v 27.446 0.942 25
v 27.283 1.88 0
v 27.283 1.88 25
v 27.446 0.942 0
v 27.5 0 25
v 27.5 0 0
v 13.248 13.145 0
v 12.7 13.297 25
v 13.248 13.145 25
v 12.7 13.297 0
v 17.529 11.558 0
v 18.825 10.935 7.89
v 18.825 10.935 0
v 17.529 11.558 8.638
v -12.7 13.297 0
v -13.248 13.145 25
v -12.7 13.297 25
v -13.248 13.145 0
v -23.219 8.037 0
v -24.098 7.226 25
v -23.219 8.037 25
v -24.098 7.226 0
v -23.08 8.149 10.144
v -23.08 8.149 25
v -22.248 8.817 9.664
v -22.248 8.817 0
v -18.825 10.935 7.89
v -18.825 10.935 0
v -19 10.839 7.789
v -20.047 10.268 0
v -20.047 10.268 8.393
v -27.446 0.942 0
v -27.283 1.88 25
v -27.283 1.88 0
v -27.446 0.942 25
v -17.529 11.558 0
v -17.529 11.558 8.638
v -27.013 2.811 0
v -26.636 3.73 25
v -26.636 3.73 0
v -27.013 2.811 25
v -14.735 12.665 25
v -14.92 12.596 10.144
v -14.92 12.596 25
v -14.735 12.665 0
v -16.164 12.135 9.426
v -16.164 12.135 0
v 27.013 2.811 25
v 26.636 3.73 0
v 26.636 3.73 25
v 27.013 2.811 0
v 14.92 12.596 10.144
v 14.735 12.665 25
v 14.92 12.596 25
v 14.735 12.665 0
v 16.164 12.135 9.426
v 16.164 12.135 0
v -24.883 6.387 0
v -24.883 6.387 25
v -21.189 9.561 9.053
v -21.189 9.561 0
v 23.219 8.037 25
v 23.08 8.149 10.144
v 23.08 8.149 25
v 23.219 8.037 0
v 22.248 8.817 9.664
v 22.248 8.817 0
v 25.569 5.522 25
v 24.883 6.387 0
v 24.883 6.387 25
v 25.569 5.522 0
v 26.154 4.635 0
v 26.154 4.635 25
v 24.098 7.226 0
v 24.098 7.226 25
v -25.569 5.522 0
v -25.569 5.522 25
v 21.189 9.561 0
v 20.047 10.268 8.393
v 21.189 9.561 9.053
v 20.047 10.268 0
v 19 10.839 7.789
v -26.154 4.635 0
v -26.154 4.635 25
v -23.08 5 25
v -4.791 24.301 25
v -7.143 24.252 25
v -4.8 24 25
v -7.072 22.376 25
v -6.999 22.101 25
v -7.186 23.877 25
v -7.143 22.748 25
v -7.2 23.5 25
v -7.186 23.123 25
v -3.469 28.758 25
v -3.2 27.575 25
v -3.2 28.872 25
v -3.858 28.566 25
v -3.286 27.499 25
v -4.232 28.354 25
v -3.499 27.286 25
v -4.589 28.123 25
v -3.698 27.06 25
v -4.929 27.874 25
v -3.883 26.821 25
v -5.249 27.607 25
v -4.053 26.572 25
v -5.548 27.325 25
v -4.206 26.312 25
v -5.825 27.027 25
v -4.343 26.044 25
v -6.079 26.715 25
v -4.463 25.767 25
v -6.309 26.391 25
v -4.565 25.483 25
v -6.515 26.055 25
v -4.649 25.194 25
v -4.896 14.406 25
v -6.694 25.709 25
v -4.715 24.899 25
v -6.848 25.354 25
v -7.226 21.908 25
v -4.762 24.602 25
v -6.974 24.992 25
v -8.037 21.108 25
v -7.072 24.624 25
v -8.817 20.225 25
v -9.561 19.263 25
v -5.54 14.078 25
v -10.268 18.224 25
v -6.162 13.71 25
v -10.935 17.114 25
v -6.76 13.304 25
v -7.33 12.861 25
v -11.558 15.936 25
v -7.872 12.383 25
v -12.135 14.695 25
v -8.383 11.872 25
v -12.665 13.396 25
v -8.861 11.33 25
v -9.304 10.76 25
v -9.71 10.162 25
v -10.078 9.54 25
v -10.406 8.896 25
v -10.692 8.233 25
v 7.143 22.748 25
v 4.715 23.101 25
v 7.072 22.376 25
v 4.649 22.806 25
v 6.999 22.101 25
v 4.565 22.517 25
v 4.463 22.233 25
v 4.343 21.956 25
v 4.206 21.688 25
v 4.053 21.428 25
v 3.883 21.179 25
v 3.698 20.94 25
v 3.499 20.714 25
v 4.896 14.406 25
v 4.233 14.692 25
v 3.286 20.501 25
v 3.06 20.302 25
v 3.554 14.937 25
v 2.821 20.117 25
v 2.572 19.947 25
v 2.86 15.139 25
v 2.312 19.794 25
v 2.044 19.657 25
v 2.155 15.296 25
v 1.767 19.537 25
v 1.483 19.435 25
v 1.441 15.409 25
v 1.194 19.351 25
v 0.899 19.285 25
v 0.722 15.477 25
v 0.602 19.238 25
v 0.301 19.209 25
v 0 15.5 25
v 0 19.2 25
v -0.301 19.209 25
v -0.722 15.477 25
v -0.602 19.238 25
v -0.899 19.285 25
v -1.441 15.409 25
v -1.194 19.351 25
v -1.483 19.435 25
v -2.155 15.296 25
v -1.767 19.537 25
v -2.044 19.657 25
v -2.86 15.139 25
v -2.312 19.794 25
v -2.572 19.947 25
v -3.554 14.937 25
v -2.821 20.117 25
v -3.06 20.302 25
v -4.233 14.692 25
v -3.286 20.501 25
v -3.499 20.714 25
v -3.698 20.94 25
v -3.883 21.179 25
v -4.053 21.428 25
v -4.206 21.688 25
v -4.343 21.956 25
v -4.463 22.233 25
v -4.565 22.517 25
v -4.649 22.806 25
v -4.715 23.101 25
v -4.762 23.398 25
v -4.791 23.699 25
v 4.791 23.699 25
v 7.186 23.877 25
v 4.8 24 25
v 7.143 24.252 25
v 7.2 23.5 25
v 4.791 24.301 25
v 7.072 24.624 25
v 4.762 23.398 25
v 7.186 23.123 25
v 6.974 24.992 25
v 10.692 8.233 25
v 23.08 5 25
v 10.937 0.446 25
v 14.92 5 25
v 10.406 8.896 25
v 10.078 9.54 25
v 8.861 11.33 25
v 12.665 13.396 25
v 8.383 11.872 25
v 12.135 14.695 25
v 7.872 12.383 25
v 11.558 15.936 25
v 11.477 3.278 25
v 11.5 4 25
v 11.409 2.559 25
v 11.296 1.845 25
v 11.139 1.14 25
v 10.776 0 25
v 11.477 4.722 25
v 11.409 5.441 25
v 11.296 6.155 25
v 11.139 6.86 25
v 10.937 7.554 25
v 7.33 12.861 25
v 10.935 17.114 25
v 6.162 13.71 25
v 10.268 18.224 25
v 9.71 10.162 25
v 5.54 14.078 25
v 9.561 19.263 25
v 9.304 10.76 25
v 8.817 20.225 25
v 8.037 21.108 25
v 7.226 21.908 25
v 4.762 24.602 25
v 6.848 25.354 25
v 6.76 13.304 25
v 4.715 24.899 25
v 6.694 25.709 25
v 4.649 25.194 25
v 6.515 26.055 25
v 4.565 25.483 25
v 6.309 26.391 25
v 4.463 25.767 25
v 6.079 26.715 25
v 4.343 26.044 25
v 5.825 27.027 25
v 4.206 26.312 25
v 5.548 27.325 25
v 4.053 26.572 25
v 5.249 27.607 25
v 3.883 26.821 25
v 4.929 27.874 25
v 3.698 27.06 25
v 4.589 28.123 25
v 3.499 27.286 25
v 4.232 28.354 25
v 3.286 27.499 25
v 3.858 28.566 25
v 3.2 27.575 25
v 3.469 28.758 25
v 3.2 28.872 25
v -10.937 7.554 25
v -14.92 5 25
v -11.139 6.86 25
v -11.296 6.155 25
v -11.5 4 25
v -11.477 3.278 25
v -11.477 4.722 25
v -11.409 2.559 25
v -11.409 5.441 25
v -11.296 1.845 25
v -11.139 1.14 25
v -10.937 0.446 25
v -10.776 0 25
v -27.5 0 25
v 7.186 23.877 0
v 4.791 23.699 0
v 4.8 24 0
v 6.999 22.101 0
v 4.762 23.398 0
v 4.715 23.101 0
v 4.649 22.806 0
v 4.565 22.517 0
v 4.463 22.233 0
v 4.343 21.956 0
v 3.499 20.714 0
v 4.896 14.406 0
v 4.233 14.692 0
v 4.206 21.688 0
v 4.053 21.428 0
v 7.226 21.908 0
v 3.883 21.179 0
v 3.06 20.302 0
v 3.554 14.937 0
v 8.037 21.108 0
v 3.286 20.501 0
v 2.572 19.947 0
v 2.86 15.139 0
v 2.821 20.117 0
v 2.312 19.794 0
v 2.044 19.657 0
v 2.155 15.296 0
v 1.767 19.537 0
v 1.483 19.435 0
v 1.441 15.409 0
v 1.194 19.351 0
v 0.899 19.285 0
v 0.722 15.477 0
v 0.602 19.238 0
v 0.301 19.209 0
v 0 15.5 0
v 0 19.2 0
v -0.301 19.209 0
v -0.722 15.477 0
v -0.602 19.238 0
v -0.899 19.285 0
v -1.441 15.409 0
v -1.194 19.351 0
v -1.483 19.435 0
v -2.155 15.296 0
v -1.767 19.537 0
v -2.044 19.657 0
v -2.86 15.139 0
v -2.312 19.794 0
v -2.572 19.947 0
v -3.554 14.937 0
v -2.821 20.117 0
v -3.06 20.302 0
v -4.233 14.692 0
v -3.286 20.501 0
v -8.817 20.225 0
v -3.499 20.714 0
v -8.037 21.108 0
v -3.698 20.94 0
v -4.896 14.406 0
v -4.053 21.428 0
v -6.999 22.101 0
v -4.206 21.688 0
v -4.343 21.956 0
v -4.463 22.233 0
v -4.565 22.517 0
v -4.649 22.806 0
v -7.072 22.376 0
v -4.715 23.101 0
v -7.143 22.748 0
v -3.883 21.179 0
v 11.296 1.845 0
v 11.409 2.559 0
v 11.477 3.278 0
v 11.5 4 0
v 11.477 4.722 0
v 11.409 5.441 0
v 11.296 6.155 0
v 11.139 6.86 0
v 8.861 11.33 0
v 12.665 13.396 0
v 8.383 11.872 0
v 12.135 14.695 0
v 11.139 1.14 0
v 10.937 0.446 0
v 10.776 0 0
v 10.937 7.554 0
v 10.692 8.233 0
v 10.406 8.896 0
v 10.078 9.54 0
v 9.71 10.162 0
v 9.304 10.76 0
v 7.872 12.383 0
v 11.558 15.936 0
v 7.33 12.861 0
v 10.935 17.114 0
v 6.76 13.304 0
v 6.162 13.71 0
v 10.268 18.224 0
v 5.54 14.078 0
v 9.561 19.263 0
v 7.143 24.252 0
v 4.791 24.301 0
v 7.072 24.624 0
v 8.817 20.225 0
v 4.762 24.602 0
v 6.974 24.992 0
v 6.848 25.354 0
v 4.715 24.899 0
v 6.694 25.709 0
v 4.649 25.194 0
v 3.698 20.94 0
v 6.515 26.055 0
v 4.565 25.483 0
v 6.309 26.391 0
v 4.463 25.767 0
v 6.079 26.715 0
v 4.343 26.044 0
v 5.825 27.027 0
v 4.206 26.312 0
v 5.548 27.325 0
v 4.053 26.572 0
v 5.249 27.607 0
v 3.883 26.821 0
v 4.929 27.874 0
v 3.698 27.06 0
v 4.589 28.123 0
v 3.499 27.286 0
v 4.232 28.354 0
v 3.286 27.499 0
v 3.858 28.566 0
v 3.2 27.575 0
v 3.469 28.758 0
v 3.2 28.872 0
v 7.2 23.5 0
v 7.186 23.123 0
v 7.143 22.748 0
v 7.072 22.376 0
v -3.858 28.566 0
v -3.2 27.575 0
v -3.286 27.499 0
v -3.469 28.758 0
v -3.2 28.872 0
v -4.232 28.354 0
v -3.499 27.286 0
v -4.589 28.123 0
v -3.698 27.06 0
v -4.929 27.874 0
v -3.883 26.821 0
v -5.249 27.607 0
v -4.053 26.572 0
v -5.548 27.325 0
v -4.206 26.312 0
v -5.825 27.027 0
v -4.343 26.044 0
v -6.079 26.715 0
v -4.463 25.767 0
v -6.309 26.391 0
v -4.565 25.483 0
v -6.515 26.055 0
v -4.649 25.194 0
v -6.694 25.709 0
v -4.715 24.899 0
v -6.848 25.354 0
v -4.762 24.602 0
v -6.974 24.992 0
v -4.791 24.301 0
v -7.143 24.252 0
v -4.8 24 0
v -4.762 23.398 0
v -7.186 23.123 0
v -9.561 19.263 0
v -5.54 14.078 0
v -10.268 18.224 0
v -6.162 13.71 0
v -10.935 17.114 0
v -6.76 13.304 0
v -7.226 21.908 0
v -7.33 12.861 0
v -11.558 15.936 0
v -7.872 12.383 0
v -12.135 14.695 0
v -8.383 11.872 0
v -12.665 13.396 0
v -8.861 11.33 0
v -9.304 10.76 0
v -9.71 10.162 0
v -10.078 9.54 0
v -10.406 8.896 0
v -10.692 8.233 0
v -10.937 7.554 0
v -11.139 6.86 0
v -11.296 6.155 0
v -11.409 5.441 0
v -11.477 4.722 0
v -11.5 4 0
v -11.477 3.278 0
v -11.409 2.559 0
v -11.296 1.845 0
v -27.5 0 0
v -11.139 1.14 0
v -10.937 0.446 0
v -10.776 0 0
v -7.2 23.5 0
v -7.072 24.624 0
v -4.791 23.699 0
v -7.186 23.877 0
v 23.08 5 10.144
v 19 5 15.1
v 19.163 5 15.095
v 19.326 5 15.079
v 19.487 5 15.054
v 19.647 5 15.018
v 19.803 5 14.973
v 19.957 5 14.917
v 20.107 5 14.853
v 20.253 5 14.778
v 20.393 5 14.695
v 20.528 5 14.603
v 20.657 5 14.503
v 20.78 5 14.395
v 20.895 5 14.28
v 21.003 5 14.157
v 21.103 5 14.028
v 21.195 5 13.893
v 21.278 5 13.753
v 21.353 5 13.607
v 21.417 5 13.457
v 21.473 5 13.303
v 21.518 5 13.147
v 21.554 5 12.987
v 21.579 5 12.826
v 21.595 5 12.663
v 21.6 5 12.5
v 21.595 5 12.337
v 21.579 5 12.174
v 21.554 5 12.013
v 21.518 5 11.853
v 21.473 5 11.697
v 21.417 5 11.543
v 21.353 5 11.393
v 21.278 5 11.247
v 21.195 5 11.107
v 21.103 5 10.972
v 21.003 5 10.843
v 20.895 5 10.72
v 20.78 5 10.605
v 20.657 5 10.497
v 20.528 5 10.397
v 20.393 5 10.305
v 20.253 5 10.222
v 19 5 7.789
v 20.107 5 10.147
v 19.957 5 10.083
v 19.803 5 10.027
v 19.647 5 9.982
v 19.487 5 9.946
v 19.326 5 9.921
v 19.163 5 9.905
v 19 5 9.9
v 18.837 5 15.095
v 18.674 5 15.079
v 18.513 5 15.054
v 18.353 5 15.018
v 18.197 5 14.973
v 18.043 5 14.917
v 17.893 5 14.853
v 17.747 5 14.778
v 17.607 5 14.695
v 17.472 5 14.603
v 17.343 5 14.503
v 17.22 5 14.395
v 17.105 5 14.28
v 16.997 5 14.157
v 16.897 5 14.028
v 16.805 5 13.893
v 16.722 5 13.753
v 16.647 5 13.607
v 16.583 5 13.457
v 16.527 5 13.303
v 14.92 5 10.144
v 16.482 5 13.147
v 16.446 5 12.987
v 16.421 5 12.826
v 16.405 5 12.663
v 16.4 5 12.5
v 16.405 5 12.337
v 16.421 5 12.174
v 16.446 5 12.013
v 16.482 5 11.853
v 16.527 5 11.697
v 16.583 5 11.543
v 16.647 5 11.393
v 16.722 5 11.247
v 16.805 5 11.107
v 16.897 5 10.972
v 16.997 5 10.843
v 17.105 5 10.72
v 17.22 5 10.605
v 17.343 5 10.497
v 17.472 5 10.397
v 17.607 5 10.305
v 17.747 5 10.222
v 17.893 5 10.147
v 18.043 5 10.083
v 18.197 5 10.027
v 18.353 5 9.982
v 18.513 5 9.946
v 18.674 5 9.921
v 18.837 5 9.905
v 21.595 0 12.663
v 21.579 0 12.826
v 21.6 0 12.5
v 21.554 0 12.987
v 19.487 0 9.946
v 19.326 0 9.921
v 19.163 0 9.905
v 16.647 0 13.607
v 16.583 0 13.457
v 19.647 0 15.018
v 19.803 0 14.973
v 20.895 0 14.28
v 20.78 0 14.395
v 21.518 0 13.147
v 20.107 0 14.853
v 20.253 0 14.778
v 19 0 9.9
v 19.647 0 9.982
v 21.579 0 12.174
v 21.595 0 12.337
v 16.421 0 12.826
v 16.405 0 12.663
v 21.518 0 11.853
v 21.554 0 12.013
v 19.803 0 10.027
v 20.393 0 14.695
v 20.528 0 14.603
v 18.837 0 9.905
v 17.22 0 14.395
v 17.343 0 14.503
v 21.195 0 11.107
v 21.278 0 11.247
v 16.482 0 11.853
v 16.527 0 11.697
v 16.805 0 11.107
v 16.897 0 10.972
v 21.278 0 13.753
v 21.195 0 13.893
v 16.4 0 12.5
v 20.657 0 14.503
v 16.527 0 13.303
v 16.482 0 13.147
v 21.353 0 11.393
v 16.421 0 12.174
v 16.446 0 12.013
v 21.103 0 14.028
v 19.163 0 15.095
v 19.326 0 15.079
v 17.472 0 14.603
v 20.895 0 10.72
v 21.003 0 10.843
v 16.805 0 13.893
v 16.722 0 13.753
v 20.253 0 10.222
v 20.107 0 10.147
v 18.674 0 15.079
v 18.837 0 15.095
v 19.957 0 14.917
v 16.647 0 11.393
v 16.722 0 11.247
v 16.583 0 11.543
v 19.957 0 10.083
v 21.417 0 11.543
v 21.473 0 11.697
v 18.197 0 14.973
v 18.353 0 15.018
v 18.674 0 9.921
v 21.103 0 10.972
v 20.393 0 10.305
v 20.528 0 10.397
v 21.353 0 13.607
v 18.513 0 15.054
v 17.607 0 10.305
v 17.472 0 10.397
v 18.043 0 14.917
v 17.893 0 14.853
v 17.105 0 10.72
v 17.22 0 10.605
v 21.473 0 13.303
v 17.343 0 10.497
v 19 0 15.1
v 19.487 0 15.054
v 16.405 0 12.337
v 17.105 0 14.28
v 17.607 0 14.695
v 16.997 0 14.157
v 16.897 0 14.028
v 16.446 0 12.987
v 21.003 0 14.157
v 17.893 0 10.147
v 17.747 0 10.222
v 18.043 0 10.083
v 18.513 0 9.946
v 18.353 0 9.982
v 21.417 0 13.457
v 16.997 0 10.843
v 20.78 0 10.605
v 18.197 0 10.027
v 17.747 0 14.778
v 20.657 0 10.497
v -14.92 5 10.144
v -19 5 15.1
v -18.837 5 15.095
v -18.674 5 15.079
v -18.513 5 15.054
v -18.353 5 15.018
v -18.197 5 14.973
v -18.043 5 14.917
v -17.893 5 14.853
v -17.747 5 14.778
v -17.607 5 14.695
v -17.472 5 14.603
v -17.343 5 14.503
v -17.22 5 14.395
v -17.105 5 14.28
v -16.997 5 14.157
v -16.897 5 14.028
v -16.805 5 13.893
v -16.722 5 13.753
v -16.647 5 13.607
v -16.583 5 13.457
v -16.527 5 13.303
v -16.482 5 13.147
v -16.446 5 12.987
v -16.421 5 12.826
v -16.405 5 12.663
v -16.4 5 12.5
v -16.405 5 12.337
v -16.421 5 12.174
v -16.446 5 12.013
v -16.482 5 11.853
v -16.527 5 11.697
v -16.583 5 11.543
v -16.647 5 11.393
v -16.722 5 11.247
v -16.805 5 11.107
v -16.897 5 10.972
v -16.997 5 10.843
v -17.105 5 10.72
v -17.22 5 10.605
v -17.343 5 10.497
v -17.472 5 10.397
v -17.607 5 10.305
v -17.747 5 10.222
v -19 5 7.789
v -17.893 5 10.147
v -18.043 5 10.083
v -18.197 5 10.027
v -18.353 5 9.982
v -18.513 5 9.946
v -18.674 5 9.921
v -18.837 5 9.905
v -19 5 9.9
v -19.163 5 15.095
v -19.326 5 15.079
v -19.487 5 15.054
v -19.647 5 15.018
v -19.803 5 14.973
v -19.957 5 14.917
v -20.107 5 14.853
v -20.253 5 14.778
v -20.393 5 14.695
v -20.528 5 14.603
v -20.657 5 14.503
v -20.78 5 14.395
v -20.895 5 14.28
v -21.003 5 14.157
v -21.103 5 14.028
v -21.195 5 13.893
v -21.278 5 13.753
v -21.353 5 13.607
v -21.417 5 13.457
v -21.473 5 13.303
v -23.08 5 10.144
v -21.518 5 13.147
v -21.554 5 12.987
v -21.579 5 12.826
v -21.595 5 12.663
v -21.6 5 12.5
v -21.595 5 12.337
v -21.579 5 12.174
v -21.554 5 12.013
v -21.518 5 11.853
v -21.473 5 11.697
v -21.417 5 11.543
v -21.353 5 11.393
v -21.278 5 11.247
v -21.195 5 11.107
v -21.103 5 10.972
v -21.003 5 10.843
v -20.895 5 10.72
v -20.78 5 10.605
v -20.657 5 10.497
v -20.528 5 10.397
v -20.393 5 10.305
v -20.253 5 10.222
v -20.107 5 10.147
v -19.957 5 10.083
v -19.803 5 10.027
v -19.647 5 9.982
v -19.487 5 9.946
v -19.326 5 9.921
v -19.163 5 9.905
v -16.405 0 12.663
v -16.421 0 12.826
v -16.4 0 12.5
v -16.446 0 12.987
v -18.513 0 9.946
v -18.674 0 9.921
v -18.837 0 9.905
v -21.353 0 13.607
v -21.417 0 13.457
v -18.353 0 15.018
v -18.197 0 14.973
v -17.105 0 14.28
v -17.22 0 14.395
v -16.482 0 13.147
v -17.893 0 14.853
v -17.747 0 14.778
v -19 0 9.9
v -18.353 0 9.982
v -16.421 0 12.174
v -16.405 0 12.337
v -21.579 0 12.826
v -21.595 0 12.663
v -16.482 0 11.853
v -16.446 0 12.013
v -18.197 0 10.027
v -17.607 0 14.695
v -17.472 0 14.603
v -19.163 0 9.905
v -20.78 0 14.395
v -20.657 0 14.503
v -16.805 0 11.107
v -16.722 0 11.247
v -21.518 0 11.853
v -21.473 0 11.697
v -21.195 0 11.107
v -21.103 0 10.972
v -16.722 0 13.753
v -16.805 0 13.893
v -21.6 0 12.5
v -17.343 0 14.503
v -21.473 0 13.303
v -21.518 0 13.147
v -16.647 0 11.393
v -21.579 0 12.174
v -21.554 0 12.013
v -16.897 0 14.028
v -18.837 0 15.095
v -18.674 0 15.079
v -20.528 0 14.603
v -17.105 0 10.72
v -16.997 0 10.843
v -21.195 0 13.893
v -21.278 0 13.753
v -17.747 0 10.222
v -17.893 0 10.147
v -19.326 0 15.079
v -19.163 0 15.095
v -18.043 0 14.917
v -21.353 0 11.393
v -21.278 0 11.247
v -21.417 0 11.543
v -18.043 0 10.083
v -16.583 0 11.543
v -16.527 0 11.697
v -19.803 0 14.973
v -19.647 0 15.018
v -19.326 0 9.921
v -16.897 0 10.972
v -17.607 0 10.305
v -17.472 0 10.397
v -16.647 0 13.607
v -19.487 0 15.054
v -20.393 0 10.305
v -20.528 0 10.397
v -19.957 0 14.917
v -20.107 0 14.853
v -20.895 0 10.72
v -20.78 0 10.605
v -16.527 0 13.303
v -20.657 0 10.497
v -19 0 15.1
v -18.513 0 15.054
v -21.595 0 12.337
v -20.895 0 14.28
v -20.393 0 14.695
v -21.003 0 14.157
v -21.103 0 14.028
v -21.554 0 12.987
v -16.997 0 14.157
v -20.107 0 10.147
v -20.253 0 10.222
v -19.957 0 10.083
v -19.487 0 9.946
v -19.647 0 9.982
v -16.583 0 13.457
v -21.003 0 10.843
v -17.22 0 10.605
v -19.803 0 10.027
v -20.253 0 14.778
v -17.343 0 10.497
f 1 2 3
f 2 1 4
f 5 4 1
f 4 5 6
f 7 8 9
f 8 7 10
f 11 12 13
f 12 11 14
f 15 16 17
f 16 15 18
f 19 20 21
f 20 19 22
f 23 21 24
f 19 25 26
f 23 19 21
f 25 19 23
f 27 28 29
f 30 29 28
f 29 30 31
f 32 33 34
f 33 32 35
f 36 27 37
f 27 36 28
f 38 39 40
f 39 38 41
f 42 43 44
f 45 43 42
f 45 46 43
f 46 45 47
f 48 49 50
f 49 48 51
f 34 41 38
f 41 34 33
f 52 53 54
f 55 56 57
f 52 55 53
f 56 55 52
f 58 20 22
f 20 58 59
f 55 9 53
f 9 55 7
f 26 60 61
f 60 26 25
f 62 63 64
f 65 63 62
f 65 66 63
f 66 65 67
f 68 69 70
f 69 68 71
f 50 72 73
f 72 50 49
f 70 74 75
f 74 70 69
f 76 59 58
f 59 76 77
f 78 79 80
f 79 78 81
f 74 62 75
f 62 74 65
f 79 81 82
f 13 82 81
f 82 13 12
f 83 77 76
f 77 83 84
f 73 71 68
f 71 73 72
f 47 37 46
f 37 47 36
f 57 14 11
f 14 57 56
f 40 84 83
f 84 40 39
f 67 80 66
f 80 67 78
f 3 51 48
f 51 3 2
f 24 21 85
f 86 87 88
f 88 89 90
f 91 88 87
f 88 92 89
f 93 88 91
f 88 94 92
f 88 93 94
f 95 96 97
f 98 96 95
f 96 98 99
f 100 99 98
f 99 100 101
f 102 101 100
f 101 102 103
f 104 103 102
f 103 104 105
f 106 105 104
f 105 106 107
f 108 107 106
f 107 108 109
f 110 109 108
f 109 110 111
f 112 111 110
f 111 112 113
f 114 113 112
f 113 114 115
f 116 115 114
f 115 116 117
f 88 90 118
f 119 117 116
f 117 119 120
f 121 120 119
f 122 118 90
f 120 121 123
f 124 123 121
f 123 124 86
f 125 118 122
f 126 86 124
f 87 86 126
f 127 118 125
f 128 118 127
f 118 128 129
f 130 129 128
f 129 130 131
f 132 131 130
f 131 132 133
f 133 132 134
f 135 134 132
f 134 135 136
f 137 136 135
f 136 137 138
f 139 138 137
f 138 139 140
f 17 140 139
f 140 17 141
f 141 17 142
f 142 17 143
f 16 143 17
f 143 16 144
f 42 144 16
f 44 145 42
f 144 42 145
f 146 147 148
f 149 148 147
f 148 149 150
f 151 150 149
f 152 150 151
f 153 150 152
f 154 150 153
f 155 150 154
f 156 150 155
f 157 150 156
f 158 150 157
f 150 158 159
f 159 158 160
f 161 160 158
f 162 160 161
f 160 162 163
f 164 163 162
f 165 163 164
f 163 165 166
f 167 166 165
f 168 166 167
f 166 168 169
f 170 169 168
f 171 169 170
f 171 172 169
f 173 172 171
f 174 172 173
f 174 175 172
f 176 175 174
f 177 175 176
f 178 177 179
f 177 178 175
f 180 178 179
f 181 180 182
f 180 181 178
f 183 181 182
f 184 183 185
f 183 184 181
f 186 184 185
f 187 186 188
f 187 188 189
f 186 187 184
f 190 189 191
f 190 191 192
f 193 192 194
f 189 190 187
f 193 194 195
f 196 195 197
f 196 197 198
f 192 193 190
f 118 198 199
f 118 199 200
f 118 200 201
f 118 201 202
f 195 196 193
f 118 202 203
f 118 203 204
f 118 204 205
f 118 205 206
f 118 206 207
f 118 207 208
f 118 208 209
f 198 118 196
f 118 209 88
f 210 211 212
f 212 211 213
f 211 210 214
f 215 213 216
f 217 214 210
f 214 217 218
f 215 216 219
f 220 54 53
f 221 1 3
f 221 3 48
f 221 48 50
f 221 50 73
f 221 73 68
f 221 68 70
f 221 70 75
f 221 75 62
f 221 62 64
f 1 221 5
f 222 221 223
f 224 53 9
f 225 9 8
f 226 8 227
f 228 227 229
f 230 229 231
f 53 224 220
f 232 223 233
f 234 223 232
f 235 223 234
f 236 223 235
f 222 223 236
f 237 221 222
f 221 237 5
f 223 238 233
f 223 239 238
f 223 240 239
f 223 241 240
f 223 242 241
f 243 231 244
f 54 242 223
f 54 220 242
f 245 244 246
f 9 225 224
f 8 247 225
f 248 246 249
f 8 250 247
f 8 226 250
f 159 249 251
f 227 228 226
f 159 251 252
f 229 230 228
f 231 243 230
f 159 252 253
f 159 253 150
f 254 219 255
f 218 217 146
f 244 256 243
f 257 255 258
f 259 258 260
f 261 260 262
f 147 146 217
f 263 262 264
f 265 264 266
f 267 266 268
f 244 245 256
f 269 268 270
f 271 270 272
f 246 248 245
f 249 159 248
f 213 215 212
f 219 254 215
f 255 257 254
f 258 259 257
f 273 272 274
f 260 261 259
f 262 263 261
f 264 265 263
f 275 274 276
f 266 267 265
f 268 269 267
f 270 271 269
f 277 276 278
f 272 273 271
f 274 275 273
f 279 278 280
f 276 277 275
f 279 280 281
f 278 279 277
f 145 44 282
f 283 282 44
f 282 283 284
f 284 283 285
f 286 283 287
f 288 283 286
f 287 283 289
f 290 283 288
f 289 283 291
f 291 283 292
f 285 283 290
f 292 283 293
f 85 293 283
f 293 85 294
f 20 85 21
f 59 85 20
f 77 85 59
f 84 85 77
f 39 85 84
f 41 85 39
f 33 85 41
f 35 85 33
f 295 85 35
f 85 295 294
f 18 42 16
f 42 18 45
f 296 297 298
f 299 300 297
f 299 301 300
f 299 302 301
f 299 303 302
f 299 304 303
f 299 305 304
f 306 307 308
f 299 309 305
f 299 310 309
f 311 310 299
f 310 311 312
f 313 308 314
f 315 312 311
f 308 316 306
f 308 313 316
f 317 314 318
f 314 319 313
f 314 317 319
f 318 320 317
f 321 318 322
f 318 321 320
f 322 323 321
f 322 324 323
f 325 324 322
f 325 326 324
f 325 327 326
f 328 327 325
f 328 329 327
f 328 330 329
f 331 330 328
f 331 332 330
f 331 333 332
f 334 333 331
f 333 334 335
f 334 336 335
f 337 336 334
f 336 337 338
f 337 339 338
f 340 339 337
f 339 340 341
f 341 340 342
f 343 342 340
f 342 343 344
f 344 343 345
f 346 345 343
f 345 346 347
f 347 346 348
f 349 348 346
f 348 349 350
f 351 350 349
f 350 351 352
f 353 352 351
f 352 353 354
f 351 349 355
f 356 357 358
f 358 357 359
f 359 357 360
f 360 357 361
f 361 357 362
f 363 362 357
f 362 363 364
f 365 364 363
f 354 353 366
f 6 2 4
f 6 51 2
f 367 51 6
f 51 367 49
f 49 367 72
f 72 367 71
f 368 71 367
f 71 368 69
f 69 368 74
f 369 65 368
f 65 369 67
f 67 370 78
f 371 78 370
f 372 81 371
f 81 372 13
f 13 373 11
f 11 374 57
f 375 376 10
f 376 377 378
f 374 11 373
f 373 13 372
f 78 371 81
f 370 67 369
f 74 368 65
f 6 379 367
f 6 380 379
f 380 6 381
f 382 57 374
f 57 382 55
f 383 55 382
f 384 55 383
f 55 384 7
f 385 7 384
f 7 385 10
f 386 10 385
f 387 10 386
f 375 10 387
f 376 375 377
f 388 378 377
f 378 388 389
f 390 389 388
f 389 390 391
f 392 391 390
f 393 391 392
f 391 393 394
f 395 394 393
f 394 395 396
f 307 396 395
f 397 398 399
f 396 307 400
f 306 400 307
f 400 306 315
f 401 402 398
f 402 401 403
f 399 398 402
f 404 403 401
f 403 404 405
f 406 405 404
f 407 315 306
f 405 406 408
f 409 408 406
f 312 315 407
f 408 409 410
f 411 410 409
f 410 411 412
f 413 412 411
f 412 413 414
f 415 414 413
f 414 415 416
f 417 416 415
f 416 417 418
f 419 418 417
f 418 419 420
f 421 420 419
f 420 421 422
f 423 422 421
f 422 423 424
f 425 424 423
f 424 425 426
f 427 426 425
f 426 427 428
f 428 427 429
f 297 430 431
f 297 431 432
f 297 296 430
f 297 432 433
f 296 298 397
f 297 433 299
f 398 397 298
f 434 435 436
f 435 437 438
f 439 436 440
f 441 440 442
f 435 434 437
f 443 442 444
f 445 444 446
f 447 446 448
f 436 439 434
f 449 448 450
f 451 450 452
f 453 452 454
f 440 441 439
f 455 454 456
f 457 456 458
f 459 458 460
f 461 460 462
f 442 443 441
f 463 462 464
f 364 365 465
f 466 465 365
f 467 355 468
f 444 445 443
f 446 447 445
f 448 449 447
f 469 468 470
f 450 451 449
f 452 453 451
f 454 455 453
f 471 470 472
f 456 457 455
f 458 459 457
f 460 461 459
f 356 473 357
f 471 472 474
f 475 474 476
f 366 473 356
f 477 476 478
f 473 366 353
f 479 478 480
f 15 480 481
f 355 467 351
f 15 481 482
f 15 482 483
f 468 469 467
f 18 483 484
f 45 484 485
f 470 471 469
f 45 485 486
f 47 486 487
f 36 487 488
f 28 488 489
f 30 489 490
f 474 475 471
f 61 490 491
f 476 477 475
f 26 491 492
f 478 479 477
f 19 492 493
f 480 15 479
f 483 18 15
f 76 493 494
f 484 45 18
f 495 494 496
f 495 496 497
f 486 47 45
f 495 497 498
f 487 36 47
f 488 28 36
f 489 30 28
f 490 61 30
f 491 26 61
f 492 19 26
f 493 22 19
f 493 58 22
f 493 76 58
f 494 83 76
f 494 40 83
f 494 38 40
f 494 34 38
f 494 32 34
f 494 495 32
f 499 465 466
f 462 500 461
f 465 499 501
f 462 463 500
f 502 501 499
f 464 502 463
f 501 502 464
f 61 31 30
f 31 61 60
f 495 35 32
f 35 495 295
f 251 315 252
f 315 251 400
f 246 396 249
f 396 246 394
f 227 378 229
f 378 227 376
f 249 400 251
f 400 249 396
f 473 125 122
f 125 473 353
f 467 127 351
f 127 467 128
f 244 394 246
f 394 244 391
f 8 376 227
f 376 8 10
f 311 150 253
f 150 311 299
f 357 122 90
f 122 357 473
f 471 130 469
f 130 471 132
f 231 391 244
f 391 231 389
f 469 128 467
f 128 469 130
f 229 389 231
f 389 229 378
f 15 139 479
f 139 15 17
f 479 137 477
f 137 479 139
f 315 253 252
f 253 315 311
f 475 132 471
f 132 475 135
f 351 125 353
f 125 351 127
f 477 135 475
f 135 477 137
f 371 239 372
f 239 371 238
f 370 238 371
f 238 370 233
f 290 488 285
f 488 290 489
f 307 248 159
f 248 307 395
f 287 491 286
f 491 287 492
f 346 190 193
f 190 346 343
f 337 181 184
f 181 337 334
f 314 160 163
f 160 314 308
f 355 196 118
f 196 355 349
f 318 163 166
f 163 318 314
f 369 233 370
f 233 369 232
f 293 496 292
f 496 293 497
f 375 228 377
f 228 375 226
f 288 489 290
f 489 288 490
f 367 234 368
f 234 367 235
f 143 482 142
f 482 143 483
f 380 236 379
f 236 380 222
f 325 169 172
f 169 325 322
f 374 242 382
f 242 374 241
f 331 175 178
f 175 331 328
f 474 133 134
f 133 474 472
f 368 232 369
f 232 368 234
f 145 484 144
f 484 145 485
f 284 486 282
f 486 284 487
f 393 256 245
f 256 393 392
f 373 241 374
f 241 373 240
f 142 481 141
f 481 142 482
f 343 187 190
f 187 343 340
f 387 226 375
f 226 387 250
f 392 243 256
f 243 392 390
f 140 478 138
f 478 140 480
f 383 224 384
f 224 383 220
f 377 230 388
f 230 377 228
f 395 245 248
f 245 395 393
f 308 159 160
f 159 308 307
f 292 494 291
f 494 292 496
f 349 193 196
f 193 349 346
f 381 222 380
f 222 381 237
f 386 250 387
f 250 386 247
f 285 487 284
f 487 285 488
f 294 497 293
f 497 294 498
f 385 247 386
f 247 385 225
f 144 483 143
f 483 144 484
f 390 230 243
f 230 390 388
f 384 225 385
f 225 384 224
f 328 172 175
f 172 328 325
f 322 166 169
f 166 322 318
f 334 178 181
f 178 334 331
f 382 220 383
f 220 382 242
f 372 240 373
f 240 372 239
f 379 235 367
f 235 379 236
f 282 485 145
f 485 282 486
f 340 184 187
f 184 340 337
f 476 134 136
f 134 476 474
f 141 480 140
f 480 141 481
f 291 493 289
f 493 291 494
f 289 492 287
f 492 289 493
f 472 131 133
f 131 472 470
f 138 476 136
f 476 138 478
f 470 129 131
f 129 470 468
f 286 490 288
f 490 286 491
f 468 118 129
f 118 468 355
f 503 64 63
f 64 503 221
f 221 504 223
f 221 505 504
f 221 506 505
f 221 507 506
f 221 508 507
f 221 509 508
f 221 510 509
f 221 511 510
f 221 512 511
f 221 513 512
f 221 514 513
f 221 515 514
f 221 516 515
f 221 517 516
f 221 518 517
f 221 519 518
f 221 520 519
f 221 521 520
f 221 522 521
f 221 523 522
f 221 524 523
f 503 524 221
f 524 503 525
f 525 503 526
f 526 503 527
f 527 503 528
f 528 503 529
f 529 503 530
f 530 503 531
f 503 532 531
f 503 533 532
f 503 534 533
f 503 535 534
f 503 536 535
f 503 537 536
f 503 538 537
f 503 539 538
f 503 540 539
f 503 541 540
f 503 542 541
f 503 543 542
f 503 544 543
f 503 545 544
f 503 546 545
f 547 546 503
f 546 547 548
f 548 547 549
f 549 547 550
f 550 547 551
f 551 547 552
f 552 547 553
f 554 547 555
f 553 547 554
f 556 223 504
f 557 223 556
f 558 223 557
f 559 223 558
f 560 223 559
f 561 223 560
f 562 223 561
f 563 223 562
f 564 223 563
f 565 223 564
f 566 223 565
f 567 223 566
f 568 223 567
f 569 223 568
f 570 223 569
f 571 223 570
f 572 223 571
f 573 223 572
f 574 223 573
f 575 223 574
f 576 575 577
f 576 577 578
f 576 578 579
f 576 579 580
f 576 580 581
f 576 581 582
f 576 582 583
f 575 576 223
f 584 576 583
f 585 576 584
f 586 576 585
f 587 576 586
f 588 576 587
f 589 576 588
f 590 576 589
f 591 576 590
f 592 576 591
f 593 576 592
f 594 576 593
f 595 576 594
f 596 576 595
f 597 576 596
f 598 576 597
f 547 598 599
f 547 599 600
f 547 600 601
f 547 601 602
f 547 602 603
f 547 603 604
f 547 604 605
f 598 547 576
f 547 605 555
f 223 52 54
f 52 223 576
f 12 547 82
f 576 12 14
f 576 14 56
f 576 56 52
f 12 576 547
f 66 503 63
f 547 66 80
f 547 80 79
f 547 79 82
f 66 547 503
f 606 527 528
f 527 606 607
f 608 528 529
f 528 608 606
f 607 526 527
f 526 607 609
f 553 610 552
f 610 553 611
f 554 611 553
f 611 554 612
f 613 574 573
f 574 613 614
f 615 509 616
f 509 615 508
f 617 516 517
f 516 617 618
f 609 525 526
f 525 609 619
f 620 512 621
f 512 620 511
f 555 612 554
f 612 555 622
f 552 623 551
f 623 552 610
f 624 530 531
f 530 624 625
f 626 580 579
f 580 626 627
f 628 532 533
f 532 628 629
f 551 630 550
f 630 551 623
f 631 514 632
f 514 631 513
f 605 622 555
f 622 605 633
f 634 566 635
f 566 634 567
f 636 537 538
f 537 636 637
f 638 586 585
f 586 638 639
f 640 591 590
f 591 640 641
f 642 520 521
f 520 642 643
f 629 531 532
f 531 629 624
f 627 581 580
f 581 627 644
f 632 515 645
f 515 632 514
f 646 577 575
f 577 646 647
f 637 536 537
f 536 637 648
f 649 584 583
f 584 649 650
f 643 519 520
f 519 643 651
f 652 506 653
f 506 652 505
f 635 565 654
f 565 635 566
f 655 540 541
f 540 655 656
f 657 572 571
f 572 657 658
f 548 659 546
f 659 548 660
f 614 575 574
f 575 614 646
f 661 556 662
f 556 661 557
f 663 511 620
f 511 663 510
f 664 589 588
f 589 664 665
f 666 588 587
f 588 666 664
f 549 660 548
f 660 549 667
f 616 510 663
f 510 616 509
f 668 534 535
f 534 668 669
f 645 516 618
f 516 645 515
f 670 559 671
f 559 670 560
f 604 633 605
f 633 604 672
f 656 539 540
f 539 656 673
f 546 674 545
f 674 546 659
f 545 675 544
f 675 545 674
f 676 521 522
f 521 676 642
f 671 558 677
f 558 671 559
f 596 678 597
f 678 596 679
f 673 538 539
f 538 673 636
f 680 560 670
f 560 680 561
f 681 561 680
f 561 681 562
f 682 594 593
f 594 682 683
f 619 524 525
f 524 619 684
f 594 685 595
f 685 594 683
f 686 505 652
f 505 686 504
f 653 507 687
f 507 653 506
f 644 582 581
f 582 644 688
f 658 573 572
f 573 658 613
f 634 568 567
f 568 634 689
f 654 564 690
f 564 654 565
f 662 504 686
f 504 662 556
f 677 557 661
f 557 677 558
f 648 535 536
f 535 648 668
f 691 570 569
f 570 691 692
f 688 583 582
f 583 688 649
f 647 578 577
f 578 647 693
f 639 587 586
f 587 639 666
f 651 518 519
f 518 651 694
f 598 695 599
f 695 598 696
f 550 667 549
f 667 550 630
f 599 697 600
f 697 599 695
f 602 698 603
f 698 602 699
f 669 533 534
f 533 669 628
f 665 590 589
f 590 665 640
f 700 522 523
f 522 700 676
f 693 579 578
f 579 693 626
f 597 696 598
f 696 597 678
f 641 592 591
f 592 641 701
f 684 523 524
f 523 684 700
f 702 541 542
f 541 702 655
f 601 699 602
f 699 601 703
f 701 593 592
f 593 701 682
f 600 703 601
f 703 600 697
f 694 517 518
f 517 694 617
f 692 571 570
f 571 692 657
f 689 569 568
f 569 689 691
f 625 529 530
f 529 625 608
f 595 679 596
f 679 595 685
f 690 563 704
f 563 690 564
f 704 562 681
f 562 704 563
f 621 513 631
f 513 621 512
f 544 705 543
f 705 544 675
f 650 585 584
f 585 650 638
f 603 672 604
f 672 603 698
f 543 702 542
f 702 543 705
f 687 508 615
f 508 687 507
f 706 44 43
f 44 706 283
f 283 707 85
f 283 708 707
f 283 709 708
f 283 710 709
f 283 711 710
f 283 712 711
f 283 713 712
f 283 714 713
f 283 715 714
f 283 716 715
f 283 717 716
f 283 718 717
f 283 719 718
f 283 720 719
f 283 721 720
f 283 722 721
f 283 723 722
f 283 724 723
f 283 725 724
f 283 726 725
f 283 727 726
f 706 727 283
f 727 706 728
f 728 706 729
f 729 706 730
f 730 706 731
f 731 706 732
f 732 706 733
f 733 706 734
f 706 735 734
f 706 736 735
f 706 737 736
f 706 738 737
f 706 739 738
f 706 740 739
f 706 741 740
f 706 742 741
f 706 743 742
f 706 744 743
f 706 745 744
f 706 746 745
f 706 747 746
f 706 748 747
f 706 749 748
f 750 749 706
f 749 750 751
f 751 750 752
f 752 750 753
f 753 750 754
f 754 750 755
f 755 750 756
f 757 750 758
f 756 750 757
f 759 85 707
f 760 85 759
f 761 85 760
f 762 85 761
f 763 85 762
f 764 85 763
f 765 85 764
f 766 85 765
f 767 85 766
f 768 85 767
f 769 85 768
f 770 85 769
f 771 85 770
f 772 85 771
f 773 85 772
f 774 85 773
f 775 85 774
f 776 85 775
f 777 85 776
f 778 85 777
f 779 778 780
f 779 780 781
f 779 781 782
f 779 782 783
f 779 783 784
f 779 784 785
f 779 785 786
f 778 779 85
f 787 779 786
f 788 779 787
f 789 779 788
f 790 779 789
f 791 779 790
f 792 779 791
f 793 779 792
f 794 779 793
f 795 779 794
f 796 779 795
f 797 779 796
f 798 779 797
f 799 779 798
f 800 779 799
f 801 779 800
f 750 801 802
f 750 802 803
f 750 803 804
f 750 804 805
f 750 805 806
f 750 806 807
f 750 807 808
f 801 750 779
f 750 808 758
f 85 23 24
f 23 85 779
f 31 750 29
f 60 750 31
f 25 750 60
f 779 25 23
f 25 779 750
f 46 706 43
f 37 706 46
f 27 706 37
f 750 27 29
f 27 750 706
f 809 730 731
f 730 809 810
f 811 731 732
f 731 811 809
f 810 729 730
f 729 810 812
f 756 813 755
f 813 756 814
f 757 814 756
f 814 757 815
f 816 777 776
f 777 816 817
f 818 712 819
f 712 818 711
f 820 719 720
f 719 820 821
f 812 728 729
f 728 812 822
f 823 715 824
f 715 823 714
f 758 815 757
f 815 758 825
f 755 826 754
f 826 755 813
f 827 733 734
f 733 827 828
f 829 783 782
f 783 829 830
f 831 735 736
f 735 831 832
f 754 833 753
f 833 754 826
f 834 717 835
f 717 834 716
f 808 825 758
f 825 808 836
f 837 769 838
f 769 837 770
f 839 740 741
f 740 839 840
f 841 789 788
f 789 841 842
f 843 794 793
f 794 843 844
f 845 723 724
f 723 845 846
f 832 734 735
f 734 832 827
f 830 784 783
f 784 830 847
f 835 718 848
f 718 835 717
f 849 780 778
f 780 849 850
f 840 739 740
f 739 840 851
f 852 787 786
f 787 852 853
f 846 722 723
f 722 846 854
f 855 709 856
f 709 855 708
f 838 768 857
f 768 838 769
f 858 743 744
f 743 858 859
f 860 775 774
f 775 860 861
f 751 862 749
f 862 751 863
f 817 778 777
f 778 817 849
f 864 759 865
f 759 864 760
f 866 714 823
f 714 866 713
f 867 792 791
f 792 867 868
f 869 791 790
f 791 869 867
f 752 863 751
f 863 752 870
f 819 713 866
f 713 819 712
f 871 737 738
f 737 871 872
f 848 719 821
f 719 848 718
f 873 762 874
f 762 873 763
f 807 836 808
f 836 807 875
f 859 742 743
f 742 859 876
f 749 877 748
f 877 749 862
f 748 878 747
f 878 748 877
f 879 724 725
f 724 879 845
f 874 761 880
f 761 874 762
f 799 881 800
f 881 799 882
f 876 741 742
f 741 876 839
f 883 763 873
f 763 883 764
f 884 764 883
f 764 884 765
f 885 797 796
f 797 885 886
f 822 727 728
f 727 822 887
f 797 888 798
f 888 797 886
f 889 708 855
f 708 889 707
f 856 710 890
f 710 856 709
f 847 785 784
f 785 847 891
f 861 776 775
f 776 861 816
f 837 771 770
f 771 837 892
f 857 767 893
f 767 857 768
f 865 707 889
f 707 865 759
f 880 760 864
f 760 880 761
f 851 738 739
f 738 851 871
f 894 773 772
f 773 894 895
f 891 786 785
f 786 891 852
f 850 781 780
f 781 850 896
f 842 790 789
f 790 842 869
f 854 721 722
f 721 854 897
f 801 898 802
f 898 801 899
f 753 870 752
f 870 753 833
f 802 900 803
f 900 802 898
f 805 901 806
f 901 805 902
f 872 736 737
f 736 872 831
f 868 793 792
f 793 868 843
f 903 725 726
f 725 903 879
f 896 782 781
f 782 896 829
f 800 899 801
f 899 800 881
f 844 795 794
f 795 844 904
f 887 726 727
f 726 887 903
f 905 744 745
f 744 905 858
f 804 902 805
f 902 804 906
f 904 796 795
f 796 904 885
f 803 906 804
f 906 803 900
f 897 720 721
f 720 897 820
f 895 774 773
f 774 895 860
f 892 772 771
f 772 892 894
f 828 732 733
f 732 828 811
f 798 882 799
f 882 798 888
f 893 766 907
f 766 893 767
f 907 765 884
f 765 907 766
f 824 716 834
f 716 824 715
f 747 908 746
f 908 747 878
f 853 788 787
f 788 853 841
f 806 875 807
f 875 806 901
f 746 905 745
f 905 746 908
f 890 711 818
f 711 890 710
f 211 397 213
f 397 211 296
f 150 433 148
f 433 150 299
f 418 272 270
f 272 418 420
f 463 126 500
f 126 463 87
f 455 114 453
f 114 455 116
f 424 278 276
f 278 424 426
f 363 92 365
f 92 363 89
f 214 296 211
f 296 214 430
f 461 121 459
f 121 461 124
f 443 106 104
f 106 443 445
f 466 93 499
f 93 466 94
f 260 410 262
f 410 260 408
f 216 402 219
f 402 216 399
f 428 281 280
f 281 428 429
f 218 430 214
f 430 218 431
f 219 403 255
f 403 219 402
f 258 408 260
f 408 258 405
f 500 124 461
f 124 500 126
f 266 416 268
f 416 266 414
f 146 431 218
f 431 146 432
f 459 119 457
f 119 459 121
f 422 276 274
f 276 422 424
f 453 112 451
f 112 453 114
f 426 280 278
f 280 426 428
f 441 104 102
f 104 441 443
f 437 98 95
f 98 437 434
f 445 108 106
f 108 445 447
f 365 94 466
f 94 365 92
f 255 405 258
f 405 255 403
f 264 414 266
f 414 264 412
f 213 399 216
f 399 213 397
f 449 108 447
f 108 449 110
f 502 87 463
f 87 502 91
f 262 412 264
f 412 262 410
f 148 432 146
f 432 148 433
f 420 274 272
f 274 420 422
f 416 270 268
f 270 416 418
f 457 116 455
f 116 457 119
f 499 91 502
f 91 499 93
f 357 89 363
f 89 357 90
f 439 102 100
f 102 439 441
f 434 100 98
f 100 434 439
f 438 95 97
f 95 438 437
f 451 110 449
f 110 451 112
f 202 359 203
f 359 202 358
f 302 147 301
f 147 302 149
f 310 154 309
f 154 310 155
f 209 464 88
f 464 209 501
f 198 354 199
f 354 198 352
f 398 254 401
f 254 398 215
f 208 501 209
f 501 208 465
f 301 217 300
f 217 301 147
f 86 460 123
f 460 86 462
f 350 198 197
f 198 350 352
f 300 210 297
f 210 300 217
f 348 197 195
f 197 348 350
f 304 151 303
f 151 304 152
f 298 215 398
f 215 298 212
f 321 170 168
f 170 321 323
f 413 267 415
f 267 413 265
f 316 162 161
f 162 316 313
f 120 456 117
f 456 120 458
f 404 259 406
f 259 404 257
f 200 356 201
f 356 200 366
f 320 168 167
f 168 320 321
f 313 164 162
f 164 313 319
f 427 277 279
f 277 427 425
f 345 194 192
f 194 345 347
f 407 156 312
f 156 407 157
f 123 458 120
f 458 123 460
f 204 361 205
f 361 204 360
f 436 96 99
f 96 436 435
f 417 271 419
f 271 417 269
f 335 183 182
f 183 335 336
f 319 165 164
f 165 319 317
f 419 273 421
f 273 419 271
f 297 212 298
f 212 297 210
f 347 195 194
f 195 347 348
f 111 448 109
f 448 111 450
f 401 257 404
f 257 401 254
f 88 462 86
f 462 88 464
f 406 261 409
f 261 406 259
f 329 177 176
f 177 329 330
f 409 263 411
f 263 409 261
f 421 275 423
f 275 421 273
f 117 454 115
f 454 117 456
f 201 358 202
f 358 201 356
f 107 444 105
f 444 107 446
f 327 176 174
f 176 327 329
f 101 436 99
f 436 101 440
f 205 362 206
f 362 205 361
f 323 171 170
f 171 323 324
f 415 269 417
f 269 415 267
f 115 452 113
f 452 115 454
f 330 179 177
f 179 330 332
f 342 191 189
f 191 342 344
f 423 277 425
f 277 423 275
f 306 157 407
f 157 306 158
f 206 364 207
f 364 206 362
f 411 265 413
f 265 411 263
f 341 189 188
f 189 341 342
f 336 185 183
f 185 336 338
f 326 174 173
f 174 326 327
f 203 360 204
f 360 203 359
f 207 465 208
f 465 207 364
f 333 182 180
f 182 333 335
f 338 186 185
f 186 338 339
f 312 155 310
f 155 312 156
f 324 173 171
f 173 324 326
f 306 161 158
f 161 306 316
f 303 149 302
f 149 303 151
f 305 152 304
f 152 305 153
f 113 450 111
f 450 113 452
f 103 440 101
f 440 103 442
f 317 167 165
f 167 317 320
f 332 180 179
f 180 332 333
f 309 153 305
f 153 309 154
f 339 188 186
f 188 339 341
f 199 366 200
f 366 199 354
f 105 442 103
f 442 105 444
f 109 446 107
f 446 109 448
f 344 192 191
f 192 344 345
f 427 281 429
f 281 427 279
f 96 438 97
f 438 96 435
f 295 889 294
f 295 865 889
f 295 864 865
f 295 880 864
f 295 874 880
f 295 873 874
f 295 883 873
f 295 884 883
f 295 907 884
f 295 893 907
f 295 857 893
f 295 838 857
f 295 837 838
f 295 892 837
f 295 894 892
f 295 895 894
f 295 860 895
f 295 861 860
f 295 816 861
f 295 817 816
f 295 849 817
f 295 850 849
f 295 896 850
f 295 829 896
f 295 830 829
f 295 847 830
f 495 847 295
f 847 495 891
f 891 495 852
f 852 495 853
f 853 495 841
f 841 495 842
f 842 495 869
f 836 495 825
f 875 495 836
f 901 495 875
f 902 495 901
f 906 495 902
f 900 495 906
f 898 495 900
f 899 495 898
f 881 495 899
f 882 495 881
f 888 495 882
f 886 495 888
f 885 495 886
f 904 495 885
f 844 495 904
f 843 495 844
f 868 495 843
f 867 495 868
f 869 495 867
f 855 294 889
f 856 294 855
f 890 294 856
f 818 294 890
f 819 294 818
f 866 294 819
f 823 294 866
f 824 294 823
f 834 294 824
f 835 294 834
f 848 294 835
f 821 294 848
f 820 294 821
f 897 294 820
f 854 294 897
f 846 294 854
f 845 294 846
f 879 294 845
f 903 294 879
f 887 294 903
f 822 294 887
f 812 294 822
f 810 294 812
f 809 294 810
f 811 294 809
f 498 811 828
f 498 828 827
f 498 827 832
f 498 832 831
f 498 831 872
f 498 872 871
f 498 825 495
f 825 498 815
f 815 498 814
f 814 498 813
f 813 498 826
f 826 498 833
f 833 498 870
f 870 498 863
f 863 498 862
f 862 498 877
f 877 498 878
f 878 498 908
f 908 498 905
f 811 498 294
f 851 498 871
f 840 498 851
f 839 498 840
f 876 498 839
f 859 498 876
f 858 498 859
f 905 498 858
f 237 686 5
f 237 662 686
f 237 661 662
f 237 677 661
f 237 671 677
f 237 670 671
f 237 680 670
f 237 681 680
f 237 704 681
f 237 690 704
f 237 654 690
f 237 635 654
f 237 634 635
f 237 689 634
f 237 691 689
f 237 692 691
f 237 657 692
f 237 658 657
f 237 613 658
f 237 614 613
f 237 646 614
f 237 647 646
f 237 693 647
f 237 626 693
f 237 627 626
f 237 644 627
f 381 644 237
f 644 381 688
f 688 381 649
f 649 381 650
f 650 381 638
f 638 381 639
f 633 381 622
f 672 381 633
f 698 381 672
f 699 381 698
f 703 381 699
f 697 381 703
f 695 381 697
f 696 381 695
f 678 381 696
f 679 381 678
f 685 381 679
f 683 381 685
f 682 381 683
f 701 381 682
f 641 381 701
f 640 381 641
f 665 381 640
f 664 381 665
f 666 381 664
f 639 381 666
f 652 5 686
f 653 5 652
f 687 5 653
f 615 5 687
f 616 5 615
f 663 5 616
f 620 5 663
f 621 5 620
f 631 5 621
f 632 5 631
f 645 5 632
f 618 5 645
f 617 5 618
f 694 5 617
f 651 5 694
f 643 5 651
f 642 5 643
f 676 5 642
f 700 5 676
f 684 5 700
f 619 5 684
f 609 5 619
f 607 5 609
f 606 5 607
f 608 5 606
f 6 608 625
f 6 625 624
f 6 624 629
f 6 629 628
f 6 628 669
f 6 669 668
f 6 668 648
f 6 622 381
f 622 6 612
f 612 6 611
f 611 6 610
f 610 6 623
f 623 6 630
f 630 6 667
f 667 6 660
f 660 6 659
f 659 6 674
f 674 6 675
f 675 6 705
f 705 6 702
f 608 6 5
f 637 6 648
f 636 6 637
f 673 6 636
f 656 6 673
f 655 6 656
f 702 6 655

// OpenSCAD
// file: 3rdparty.scad
// -------------------------------
// 3rd party stuff
// -------------------------------




/*----------------------------------------------------------------------------*
* Defines common constants used throughout the AutoSCAD libraries.
*-----------------------------------------------------------------------------*
*----------------------------------------------------------------------------*/

//--- Constants

/** The value of Pi
 */
PI = 3.1415926535897932;

/** Printer resolution (in mm)
 */
RESOLUTION = 0.3;

/** Base size for objects (in mm)
 *
 * The library is designed to generate things in 'units' - this defines the
 * size of a unit (in mm).
 */
BASE_SIZE = 2;

//--- Modules

/** Create an isosceles triangle
 *
 * The middle of the base is at origin (0, 0, 0) and the tip of the triangle
 * points along the Y axis. Depth is in the Z axis and is centered on the
 * origin. If depth is not specified it defaults to 2 units.
 */
module triangle(width, height, depth = 2) {
  angle = atan(height / (width / 2));
  difference() {
    translate(v = [ 0, height / 2, 0 ]) {
      cube(size = [ width, height, depth ], center = true);
      }
    translate(v = [ width / 2, 0, 0 ]) {
      rotate(a = [ 0, 0, 90 - angle ]) {
        translate(v = [ width / 2, height, 0 ]) {
          cube(size = [ width, height * 2, depth * 2 ], center = true);
          }
        }
      }
    translate(v = [ -width / 2, 0, 0 ]) {
      rotate(a = [ 0, 0, 270 + angle ]) {
        translate(v = [ -width / 2, height, 0 ]) {
          cube(size = [ width, height * 2, depth * 2 ], center = true);
          }
        }
      }
    }
  }

/** Create an arc
 *
 * Creates a slice of a cylinder that is 'width' along the X axis, 'height'
 * along the Y axis and 'depth' along the Z axis. The base (the flat part)
 * is centered on the origin. If 'depth' is not specified it defaults to
 * 2 units.
 */
module arc(width, height, depth = 2) {
  radius = ((width * width) + (4 * height * height)) / (8 * height);
  difference() {
    translate(v = [ 0, -(radius - height), 0 ]) {
      cylinder(h = depth, r = radius, center = true, $fs = RESOLUTION);
      }
    translate(v = [ 0, -radius, 0 ]) {
      cube(size = [ radius * 2, radius * 2, depth * 2 ], center = true);
      }
    }
  }

/** Calculates the height of a teardrop with a given radius
 */
function teardrop_length(td_radius) = td_radius + sqrt(2 * (td_radius * td_radius));

/** Generate a teardrop shape
 *
 * These shapes are useful for minimising print volume while maintaining
 * structural strength.
 */
module teardrop(td_radius, td_height = 1) {
  translate(v = [ 0, -(teardrop_length(td_radius) - td_radius), 0 ]) {
    rotate(a = [ 0, 0, 45 ]) {
      linear_extrude(height = td_height) {
        union() {
          circle(r = td_radius, $fs = RESOLUTION);
          square(size = [ td_radius, td_radius ]);
          }
        }
      }
    }
  }

/** Variation of the teardrop with a specified length
 *
 * This module allows you to specify the length of the teardrop shape as well
 * as the radius.
 */
module teardrop_scaled(td_radius, td_length, td_height = 1) {
  scale_factor = td_length / teardrop_length(td_radius);
  scale(v = [ 1, scale_factor, 1 ]) {
    teardrop(td_radius, td_height);
    }
  }

/** Create a hexagon.
 *
 * The 'size' parameter specifies the distance from the center of the
 * hexagon to the center of one of the six straight edges. The 'depth'
 * parameter specifies the size in the Z axis. The resulting object
 * is centered on the origin.
 */
module hexagon(length, depth = 2) {
  width = 2 * length * tan(30);
  union() {
    cube(size = [ length * 2, width, depth ], center = true);
    rotate(a = [ 0, 0, 60 ]) {
      cube(size = [ length * 2, width, depth ], center = true);
      }
    rotate(a = [ 0, 0, -60 ]) {
      cube(size = [ length * 2, width, depth ], center = true);
      }
    }
  }

/** Create a hexagon
 *
 * The 'radius' parameter specifies the radius of the smallest circle
 * that contains the hexagon. The 'depth' parameter specifies the size
 * in the Z axis. The resulting object is centered on the origin.
 */
module hexagonR(radius, depth = 2) {
  hexagon(radius * cos(30), depth);
  }

/** Create a hexagon
 *
 * This version of the hexagon module creates a hexagon where each
 * edge is of 'part' length. The 'depth' parameter specifies the
 * size in the Z axis. The resulting object is centered on the
 * origin.
 */
module hexagonL(part, depth = 2) {
  hexagon((part / 2) / tan(30), depth);
  }

/** Create a rounded rectangle
 */
module roundrect(width, height, depth, radius) {
  union() {
    // Make the four corner pieces
    translate(v = [ width / 2 - radius, height / 2 - radius, 0 ]) {
      cylinder(r = radius, h = depth, center = true);
    }
    translate(v = [ width / 2 - radius, -(height / 2 - radius), 0 ]) {
      cylinder(r = radius, h = depth, center = true);
    }
    translate(v = [ -(width / 2 - radius), height / 2 - radius, 0 ]) {
      cylinder(r = radius, h = depth, center = true);
    }
     translate(v = [ -(width / 2 - radius), -(height / 2 - radius), 0 ]) {
       cylinder(r = radius, h = depth, center = true);
       }
    // Add the center rectangles
    cube(size = [ width - (2 * radius), height, depth ], center = true);
    cube(size = [ width, height - (2 * radius), depth ], center = true);
    }
  }
// file: modules.scad
use <3rdparty.scad>;

// module library

// tube - make a tube
//
// ro = outer radius
// ri = inner radius
// height = height
//
module tube(ro, ri, height) {
	difference() {
		cylinder(h=height, r=ro);
		cylinder(h=height, r=ri);
	}
}



// screwWithNut - draws a screw with nut. the object is placed
//                in z-direction centered at the origin
// 
// nr: radius of the nut
// nd: nut depth
// s:  space between nut and screen head
// sd: srew depth
// sr: screwRadius
// wp: with projection
// 
module screwWithNut(nr=5, nd=6.5, s=4, sd=6.5, sr=2.6, wp=0) {
	union() {
		translate([0, 0, sd/2]) hexagon(length = nr, depth = sd);
		translate([0, 0, sd]) cylinder(h=s, r=sr);
		translate([0, 0, s + nd/2 + sd]) hexagon(length = nr, depth = nd);
		if (wp > 0) {
			translate([-nr, 0, 0]) cube([2*nr, wp, sd]);
			translate([-nr, 0, s + sd]) cube([2*nr, wp, nd]);
		}
	}
}
// main file
// ---------------------------------------------------
// imports
// ---------------------------------------------------
use <modules.scad>;

// increase resolution
$fn = 100;

// ---------------------------------------------------
// properties
// ---------------------------------------------------

he=25; // height of the object
nut_depth=4.08; // nut size for M5
screw_diameter=2.6;
min_border=4;
side_cw=2*min_border+2*nut_depth;
bottle_radius=47;
base_tube_radius=11.5;
base_tube_offset=4;


// ---------------------------------------------------
// shapes
// ---------------------------------------------------

//_all();

//_front();
_back();
//translate([0, 10, 0]) _back();


// test 
// translate([-2, -11.5, 11]) cube(4,4,4);


// ---------------------------------------------------
// modules
// ---------------------------------------------------

module _all() {
	difference() {
		union() {
			_base_fancy();
			translate([0, 23.5, 0]) scale([1.2, 1, 1]) cylinder(h=he, r=6);
		}
		translate([0, 24, 0]) cylinder(h=30, r=4.8);
		translate([-3.2, 24, 0]) cube([6.4, 6, he]);
	}
}

module _front() {
	difference() {
		_all();
		translate([-50, 0, 0]) cube(100, 50, 40);
	}
}

module _back() {
	difference() {
		_all();
		translate([-50, -100, 0]) cube(100, 50, 40);
	}
}

module _base_fancy() {
	difference() {
		difference() {
			_base();
			_fancy();
			rotate(a=[0, 0, 180]) _fancy();			
		}
		rotate(a=[5, 0, 0]) translate([0, -6.5, he-6]) _bottle();
	}
}

module _base(ro, ri, height) {
	difference() {
		union() {
			difference() {
				union() {
					scale([1.1, 0.6, 1]) cylinder(h=he, r=25);
					scale([0.6, 1, 1]) cylinder(h=he, r=25);
				}
				translate([0, base_tube_offset, 0]) cylinder(h=he, r=base_tube_radius);
			}
		}
		_nut(19, he/2, -25, 30, 10, 20);
		_nut(-19, he/2, -25, 30, 10, 20);
	}
}

module _bottle() {
	rotate(a=[0, 0, 180]) {
		union() {
			translate([0, bottle_radius+9, -25]) cylinder(h=50, r=bottle_radius);
			_nut(0, 0, -10, 40, 6);
		}
	}
}

module _nut(x=0, y=0, z=0, w=30, l=10, sdd=0) {
	rotate(a=[90, 0, 0]) {
		translate([x, y, z]) {
			screwWithNut(nr=nut_depth, nd=10, s=l, sd=sdd, st=screw_diameter, wp=w);
		}
	}
}

module _fancy() {
	translate([0, 0, 12.65]) difference() {
		cylinder(h=he, r=40);
		scale([0.7, 1, 1]) cylinder(h=30, r=25);
		translate([-50, -10, 0]) cube([100, 50, 50]);
	}
}



// ---------------------------------------------------
// trash
// ---------------------------------------------------
